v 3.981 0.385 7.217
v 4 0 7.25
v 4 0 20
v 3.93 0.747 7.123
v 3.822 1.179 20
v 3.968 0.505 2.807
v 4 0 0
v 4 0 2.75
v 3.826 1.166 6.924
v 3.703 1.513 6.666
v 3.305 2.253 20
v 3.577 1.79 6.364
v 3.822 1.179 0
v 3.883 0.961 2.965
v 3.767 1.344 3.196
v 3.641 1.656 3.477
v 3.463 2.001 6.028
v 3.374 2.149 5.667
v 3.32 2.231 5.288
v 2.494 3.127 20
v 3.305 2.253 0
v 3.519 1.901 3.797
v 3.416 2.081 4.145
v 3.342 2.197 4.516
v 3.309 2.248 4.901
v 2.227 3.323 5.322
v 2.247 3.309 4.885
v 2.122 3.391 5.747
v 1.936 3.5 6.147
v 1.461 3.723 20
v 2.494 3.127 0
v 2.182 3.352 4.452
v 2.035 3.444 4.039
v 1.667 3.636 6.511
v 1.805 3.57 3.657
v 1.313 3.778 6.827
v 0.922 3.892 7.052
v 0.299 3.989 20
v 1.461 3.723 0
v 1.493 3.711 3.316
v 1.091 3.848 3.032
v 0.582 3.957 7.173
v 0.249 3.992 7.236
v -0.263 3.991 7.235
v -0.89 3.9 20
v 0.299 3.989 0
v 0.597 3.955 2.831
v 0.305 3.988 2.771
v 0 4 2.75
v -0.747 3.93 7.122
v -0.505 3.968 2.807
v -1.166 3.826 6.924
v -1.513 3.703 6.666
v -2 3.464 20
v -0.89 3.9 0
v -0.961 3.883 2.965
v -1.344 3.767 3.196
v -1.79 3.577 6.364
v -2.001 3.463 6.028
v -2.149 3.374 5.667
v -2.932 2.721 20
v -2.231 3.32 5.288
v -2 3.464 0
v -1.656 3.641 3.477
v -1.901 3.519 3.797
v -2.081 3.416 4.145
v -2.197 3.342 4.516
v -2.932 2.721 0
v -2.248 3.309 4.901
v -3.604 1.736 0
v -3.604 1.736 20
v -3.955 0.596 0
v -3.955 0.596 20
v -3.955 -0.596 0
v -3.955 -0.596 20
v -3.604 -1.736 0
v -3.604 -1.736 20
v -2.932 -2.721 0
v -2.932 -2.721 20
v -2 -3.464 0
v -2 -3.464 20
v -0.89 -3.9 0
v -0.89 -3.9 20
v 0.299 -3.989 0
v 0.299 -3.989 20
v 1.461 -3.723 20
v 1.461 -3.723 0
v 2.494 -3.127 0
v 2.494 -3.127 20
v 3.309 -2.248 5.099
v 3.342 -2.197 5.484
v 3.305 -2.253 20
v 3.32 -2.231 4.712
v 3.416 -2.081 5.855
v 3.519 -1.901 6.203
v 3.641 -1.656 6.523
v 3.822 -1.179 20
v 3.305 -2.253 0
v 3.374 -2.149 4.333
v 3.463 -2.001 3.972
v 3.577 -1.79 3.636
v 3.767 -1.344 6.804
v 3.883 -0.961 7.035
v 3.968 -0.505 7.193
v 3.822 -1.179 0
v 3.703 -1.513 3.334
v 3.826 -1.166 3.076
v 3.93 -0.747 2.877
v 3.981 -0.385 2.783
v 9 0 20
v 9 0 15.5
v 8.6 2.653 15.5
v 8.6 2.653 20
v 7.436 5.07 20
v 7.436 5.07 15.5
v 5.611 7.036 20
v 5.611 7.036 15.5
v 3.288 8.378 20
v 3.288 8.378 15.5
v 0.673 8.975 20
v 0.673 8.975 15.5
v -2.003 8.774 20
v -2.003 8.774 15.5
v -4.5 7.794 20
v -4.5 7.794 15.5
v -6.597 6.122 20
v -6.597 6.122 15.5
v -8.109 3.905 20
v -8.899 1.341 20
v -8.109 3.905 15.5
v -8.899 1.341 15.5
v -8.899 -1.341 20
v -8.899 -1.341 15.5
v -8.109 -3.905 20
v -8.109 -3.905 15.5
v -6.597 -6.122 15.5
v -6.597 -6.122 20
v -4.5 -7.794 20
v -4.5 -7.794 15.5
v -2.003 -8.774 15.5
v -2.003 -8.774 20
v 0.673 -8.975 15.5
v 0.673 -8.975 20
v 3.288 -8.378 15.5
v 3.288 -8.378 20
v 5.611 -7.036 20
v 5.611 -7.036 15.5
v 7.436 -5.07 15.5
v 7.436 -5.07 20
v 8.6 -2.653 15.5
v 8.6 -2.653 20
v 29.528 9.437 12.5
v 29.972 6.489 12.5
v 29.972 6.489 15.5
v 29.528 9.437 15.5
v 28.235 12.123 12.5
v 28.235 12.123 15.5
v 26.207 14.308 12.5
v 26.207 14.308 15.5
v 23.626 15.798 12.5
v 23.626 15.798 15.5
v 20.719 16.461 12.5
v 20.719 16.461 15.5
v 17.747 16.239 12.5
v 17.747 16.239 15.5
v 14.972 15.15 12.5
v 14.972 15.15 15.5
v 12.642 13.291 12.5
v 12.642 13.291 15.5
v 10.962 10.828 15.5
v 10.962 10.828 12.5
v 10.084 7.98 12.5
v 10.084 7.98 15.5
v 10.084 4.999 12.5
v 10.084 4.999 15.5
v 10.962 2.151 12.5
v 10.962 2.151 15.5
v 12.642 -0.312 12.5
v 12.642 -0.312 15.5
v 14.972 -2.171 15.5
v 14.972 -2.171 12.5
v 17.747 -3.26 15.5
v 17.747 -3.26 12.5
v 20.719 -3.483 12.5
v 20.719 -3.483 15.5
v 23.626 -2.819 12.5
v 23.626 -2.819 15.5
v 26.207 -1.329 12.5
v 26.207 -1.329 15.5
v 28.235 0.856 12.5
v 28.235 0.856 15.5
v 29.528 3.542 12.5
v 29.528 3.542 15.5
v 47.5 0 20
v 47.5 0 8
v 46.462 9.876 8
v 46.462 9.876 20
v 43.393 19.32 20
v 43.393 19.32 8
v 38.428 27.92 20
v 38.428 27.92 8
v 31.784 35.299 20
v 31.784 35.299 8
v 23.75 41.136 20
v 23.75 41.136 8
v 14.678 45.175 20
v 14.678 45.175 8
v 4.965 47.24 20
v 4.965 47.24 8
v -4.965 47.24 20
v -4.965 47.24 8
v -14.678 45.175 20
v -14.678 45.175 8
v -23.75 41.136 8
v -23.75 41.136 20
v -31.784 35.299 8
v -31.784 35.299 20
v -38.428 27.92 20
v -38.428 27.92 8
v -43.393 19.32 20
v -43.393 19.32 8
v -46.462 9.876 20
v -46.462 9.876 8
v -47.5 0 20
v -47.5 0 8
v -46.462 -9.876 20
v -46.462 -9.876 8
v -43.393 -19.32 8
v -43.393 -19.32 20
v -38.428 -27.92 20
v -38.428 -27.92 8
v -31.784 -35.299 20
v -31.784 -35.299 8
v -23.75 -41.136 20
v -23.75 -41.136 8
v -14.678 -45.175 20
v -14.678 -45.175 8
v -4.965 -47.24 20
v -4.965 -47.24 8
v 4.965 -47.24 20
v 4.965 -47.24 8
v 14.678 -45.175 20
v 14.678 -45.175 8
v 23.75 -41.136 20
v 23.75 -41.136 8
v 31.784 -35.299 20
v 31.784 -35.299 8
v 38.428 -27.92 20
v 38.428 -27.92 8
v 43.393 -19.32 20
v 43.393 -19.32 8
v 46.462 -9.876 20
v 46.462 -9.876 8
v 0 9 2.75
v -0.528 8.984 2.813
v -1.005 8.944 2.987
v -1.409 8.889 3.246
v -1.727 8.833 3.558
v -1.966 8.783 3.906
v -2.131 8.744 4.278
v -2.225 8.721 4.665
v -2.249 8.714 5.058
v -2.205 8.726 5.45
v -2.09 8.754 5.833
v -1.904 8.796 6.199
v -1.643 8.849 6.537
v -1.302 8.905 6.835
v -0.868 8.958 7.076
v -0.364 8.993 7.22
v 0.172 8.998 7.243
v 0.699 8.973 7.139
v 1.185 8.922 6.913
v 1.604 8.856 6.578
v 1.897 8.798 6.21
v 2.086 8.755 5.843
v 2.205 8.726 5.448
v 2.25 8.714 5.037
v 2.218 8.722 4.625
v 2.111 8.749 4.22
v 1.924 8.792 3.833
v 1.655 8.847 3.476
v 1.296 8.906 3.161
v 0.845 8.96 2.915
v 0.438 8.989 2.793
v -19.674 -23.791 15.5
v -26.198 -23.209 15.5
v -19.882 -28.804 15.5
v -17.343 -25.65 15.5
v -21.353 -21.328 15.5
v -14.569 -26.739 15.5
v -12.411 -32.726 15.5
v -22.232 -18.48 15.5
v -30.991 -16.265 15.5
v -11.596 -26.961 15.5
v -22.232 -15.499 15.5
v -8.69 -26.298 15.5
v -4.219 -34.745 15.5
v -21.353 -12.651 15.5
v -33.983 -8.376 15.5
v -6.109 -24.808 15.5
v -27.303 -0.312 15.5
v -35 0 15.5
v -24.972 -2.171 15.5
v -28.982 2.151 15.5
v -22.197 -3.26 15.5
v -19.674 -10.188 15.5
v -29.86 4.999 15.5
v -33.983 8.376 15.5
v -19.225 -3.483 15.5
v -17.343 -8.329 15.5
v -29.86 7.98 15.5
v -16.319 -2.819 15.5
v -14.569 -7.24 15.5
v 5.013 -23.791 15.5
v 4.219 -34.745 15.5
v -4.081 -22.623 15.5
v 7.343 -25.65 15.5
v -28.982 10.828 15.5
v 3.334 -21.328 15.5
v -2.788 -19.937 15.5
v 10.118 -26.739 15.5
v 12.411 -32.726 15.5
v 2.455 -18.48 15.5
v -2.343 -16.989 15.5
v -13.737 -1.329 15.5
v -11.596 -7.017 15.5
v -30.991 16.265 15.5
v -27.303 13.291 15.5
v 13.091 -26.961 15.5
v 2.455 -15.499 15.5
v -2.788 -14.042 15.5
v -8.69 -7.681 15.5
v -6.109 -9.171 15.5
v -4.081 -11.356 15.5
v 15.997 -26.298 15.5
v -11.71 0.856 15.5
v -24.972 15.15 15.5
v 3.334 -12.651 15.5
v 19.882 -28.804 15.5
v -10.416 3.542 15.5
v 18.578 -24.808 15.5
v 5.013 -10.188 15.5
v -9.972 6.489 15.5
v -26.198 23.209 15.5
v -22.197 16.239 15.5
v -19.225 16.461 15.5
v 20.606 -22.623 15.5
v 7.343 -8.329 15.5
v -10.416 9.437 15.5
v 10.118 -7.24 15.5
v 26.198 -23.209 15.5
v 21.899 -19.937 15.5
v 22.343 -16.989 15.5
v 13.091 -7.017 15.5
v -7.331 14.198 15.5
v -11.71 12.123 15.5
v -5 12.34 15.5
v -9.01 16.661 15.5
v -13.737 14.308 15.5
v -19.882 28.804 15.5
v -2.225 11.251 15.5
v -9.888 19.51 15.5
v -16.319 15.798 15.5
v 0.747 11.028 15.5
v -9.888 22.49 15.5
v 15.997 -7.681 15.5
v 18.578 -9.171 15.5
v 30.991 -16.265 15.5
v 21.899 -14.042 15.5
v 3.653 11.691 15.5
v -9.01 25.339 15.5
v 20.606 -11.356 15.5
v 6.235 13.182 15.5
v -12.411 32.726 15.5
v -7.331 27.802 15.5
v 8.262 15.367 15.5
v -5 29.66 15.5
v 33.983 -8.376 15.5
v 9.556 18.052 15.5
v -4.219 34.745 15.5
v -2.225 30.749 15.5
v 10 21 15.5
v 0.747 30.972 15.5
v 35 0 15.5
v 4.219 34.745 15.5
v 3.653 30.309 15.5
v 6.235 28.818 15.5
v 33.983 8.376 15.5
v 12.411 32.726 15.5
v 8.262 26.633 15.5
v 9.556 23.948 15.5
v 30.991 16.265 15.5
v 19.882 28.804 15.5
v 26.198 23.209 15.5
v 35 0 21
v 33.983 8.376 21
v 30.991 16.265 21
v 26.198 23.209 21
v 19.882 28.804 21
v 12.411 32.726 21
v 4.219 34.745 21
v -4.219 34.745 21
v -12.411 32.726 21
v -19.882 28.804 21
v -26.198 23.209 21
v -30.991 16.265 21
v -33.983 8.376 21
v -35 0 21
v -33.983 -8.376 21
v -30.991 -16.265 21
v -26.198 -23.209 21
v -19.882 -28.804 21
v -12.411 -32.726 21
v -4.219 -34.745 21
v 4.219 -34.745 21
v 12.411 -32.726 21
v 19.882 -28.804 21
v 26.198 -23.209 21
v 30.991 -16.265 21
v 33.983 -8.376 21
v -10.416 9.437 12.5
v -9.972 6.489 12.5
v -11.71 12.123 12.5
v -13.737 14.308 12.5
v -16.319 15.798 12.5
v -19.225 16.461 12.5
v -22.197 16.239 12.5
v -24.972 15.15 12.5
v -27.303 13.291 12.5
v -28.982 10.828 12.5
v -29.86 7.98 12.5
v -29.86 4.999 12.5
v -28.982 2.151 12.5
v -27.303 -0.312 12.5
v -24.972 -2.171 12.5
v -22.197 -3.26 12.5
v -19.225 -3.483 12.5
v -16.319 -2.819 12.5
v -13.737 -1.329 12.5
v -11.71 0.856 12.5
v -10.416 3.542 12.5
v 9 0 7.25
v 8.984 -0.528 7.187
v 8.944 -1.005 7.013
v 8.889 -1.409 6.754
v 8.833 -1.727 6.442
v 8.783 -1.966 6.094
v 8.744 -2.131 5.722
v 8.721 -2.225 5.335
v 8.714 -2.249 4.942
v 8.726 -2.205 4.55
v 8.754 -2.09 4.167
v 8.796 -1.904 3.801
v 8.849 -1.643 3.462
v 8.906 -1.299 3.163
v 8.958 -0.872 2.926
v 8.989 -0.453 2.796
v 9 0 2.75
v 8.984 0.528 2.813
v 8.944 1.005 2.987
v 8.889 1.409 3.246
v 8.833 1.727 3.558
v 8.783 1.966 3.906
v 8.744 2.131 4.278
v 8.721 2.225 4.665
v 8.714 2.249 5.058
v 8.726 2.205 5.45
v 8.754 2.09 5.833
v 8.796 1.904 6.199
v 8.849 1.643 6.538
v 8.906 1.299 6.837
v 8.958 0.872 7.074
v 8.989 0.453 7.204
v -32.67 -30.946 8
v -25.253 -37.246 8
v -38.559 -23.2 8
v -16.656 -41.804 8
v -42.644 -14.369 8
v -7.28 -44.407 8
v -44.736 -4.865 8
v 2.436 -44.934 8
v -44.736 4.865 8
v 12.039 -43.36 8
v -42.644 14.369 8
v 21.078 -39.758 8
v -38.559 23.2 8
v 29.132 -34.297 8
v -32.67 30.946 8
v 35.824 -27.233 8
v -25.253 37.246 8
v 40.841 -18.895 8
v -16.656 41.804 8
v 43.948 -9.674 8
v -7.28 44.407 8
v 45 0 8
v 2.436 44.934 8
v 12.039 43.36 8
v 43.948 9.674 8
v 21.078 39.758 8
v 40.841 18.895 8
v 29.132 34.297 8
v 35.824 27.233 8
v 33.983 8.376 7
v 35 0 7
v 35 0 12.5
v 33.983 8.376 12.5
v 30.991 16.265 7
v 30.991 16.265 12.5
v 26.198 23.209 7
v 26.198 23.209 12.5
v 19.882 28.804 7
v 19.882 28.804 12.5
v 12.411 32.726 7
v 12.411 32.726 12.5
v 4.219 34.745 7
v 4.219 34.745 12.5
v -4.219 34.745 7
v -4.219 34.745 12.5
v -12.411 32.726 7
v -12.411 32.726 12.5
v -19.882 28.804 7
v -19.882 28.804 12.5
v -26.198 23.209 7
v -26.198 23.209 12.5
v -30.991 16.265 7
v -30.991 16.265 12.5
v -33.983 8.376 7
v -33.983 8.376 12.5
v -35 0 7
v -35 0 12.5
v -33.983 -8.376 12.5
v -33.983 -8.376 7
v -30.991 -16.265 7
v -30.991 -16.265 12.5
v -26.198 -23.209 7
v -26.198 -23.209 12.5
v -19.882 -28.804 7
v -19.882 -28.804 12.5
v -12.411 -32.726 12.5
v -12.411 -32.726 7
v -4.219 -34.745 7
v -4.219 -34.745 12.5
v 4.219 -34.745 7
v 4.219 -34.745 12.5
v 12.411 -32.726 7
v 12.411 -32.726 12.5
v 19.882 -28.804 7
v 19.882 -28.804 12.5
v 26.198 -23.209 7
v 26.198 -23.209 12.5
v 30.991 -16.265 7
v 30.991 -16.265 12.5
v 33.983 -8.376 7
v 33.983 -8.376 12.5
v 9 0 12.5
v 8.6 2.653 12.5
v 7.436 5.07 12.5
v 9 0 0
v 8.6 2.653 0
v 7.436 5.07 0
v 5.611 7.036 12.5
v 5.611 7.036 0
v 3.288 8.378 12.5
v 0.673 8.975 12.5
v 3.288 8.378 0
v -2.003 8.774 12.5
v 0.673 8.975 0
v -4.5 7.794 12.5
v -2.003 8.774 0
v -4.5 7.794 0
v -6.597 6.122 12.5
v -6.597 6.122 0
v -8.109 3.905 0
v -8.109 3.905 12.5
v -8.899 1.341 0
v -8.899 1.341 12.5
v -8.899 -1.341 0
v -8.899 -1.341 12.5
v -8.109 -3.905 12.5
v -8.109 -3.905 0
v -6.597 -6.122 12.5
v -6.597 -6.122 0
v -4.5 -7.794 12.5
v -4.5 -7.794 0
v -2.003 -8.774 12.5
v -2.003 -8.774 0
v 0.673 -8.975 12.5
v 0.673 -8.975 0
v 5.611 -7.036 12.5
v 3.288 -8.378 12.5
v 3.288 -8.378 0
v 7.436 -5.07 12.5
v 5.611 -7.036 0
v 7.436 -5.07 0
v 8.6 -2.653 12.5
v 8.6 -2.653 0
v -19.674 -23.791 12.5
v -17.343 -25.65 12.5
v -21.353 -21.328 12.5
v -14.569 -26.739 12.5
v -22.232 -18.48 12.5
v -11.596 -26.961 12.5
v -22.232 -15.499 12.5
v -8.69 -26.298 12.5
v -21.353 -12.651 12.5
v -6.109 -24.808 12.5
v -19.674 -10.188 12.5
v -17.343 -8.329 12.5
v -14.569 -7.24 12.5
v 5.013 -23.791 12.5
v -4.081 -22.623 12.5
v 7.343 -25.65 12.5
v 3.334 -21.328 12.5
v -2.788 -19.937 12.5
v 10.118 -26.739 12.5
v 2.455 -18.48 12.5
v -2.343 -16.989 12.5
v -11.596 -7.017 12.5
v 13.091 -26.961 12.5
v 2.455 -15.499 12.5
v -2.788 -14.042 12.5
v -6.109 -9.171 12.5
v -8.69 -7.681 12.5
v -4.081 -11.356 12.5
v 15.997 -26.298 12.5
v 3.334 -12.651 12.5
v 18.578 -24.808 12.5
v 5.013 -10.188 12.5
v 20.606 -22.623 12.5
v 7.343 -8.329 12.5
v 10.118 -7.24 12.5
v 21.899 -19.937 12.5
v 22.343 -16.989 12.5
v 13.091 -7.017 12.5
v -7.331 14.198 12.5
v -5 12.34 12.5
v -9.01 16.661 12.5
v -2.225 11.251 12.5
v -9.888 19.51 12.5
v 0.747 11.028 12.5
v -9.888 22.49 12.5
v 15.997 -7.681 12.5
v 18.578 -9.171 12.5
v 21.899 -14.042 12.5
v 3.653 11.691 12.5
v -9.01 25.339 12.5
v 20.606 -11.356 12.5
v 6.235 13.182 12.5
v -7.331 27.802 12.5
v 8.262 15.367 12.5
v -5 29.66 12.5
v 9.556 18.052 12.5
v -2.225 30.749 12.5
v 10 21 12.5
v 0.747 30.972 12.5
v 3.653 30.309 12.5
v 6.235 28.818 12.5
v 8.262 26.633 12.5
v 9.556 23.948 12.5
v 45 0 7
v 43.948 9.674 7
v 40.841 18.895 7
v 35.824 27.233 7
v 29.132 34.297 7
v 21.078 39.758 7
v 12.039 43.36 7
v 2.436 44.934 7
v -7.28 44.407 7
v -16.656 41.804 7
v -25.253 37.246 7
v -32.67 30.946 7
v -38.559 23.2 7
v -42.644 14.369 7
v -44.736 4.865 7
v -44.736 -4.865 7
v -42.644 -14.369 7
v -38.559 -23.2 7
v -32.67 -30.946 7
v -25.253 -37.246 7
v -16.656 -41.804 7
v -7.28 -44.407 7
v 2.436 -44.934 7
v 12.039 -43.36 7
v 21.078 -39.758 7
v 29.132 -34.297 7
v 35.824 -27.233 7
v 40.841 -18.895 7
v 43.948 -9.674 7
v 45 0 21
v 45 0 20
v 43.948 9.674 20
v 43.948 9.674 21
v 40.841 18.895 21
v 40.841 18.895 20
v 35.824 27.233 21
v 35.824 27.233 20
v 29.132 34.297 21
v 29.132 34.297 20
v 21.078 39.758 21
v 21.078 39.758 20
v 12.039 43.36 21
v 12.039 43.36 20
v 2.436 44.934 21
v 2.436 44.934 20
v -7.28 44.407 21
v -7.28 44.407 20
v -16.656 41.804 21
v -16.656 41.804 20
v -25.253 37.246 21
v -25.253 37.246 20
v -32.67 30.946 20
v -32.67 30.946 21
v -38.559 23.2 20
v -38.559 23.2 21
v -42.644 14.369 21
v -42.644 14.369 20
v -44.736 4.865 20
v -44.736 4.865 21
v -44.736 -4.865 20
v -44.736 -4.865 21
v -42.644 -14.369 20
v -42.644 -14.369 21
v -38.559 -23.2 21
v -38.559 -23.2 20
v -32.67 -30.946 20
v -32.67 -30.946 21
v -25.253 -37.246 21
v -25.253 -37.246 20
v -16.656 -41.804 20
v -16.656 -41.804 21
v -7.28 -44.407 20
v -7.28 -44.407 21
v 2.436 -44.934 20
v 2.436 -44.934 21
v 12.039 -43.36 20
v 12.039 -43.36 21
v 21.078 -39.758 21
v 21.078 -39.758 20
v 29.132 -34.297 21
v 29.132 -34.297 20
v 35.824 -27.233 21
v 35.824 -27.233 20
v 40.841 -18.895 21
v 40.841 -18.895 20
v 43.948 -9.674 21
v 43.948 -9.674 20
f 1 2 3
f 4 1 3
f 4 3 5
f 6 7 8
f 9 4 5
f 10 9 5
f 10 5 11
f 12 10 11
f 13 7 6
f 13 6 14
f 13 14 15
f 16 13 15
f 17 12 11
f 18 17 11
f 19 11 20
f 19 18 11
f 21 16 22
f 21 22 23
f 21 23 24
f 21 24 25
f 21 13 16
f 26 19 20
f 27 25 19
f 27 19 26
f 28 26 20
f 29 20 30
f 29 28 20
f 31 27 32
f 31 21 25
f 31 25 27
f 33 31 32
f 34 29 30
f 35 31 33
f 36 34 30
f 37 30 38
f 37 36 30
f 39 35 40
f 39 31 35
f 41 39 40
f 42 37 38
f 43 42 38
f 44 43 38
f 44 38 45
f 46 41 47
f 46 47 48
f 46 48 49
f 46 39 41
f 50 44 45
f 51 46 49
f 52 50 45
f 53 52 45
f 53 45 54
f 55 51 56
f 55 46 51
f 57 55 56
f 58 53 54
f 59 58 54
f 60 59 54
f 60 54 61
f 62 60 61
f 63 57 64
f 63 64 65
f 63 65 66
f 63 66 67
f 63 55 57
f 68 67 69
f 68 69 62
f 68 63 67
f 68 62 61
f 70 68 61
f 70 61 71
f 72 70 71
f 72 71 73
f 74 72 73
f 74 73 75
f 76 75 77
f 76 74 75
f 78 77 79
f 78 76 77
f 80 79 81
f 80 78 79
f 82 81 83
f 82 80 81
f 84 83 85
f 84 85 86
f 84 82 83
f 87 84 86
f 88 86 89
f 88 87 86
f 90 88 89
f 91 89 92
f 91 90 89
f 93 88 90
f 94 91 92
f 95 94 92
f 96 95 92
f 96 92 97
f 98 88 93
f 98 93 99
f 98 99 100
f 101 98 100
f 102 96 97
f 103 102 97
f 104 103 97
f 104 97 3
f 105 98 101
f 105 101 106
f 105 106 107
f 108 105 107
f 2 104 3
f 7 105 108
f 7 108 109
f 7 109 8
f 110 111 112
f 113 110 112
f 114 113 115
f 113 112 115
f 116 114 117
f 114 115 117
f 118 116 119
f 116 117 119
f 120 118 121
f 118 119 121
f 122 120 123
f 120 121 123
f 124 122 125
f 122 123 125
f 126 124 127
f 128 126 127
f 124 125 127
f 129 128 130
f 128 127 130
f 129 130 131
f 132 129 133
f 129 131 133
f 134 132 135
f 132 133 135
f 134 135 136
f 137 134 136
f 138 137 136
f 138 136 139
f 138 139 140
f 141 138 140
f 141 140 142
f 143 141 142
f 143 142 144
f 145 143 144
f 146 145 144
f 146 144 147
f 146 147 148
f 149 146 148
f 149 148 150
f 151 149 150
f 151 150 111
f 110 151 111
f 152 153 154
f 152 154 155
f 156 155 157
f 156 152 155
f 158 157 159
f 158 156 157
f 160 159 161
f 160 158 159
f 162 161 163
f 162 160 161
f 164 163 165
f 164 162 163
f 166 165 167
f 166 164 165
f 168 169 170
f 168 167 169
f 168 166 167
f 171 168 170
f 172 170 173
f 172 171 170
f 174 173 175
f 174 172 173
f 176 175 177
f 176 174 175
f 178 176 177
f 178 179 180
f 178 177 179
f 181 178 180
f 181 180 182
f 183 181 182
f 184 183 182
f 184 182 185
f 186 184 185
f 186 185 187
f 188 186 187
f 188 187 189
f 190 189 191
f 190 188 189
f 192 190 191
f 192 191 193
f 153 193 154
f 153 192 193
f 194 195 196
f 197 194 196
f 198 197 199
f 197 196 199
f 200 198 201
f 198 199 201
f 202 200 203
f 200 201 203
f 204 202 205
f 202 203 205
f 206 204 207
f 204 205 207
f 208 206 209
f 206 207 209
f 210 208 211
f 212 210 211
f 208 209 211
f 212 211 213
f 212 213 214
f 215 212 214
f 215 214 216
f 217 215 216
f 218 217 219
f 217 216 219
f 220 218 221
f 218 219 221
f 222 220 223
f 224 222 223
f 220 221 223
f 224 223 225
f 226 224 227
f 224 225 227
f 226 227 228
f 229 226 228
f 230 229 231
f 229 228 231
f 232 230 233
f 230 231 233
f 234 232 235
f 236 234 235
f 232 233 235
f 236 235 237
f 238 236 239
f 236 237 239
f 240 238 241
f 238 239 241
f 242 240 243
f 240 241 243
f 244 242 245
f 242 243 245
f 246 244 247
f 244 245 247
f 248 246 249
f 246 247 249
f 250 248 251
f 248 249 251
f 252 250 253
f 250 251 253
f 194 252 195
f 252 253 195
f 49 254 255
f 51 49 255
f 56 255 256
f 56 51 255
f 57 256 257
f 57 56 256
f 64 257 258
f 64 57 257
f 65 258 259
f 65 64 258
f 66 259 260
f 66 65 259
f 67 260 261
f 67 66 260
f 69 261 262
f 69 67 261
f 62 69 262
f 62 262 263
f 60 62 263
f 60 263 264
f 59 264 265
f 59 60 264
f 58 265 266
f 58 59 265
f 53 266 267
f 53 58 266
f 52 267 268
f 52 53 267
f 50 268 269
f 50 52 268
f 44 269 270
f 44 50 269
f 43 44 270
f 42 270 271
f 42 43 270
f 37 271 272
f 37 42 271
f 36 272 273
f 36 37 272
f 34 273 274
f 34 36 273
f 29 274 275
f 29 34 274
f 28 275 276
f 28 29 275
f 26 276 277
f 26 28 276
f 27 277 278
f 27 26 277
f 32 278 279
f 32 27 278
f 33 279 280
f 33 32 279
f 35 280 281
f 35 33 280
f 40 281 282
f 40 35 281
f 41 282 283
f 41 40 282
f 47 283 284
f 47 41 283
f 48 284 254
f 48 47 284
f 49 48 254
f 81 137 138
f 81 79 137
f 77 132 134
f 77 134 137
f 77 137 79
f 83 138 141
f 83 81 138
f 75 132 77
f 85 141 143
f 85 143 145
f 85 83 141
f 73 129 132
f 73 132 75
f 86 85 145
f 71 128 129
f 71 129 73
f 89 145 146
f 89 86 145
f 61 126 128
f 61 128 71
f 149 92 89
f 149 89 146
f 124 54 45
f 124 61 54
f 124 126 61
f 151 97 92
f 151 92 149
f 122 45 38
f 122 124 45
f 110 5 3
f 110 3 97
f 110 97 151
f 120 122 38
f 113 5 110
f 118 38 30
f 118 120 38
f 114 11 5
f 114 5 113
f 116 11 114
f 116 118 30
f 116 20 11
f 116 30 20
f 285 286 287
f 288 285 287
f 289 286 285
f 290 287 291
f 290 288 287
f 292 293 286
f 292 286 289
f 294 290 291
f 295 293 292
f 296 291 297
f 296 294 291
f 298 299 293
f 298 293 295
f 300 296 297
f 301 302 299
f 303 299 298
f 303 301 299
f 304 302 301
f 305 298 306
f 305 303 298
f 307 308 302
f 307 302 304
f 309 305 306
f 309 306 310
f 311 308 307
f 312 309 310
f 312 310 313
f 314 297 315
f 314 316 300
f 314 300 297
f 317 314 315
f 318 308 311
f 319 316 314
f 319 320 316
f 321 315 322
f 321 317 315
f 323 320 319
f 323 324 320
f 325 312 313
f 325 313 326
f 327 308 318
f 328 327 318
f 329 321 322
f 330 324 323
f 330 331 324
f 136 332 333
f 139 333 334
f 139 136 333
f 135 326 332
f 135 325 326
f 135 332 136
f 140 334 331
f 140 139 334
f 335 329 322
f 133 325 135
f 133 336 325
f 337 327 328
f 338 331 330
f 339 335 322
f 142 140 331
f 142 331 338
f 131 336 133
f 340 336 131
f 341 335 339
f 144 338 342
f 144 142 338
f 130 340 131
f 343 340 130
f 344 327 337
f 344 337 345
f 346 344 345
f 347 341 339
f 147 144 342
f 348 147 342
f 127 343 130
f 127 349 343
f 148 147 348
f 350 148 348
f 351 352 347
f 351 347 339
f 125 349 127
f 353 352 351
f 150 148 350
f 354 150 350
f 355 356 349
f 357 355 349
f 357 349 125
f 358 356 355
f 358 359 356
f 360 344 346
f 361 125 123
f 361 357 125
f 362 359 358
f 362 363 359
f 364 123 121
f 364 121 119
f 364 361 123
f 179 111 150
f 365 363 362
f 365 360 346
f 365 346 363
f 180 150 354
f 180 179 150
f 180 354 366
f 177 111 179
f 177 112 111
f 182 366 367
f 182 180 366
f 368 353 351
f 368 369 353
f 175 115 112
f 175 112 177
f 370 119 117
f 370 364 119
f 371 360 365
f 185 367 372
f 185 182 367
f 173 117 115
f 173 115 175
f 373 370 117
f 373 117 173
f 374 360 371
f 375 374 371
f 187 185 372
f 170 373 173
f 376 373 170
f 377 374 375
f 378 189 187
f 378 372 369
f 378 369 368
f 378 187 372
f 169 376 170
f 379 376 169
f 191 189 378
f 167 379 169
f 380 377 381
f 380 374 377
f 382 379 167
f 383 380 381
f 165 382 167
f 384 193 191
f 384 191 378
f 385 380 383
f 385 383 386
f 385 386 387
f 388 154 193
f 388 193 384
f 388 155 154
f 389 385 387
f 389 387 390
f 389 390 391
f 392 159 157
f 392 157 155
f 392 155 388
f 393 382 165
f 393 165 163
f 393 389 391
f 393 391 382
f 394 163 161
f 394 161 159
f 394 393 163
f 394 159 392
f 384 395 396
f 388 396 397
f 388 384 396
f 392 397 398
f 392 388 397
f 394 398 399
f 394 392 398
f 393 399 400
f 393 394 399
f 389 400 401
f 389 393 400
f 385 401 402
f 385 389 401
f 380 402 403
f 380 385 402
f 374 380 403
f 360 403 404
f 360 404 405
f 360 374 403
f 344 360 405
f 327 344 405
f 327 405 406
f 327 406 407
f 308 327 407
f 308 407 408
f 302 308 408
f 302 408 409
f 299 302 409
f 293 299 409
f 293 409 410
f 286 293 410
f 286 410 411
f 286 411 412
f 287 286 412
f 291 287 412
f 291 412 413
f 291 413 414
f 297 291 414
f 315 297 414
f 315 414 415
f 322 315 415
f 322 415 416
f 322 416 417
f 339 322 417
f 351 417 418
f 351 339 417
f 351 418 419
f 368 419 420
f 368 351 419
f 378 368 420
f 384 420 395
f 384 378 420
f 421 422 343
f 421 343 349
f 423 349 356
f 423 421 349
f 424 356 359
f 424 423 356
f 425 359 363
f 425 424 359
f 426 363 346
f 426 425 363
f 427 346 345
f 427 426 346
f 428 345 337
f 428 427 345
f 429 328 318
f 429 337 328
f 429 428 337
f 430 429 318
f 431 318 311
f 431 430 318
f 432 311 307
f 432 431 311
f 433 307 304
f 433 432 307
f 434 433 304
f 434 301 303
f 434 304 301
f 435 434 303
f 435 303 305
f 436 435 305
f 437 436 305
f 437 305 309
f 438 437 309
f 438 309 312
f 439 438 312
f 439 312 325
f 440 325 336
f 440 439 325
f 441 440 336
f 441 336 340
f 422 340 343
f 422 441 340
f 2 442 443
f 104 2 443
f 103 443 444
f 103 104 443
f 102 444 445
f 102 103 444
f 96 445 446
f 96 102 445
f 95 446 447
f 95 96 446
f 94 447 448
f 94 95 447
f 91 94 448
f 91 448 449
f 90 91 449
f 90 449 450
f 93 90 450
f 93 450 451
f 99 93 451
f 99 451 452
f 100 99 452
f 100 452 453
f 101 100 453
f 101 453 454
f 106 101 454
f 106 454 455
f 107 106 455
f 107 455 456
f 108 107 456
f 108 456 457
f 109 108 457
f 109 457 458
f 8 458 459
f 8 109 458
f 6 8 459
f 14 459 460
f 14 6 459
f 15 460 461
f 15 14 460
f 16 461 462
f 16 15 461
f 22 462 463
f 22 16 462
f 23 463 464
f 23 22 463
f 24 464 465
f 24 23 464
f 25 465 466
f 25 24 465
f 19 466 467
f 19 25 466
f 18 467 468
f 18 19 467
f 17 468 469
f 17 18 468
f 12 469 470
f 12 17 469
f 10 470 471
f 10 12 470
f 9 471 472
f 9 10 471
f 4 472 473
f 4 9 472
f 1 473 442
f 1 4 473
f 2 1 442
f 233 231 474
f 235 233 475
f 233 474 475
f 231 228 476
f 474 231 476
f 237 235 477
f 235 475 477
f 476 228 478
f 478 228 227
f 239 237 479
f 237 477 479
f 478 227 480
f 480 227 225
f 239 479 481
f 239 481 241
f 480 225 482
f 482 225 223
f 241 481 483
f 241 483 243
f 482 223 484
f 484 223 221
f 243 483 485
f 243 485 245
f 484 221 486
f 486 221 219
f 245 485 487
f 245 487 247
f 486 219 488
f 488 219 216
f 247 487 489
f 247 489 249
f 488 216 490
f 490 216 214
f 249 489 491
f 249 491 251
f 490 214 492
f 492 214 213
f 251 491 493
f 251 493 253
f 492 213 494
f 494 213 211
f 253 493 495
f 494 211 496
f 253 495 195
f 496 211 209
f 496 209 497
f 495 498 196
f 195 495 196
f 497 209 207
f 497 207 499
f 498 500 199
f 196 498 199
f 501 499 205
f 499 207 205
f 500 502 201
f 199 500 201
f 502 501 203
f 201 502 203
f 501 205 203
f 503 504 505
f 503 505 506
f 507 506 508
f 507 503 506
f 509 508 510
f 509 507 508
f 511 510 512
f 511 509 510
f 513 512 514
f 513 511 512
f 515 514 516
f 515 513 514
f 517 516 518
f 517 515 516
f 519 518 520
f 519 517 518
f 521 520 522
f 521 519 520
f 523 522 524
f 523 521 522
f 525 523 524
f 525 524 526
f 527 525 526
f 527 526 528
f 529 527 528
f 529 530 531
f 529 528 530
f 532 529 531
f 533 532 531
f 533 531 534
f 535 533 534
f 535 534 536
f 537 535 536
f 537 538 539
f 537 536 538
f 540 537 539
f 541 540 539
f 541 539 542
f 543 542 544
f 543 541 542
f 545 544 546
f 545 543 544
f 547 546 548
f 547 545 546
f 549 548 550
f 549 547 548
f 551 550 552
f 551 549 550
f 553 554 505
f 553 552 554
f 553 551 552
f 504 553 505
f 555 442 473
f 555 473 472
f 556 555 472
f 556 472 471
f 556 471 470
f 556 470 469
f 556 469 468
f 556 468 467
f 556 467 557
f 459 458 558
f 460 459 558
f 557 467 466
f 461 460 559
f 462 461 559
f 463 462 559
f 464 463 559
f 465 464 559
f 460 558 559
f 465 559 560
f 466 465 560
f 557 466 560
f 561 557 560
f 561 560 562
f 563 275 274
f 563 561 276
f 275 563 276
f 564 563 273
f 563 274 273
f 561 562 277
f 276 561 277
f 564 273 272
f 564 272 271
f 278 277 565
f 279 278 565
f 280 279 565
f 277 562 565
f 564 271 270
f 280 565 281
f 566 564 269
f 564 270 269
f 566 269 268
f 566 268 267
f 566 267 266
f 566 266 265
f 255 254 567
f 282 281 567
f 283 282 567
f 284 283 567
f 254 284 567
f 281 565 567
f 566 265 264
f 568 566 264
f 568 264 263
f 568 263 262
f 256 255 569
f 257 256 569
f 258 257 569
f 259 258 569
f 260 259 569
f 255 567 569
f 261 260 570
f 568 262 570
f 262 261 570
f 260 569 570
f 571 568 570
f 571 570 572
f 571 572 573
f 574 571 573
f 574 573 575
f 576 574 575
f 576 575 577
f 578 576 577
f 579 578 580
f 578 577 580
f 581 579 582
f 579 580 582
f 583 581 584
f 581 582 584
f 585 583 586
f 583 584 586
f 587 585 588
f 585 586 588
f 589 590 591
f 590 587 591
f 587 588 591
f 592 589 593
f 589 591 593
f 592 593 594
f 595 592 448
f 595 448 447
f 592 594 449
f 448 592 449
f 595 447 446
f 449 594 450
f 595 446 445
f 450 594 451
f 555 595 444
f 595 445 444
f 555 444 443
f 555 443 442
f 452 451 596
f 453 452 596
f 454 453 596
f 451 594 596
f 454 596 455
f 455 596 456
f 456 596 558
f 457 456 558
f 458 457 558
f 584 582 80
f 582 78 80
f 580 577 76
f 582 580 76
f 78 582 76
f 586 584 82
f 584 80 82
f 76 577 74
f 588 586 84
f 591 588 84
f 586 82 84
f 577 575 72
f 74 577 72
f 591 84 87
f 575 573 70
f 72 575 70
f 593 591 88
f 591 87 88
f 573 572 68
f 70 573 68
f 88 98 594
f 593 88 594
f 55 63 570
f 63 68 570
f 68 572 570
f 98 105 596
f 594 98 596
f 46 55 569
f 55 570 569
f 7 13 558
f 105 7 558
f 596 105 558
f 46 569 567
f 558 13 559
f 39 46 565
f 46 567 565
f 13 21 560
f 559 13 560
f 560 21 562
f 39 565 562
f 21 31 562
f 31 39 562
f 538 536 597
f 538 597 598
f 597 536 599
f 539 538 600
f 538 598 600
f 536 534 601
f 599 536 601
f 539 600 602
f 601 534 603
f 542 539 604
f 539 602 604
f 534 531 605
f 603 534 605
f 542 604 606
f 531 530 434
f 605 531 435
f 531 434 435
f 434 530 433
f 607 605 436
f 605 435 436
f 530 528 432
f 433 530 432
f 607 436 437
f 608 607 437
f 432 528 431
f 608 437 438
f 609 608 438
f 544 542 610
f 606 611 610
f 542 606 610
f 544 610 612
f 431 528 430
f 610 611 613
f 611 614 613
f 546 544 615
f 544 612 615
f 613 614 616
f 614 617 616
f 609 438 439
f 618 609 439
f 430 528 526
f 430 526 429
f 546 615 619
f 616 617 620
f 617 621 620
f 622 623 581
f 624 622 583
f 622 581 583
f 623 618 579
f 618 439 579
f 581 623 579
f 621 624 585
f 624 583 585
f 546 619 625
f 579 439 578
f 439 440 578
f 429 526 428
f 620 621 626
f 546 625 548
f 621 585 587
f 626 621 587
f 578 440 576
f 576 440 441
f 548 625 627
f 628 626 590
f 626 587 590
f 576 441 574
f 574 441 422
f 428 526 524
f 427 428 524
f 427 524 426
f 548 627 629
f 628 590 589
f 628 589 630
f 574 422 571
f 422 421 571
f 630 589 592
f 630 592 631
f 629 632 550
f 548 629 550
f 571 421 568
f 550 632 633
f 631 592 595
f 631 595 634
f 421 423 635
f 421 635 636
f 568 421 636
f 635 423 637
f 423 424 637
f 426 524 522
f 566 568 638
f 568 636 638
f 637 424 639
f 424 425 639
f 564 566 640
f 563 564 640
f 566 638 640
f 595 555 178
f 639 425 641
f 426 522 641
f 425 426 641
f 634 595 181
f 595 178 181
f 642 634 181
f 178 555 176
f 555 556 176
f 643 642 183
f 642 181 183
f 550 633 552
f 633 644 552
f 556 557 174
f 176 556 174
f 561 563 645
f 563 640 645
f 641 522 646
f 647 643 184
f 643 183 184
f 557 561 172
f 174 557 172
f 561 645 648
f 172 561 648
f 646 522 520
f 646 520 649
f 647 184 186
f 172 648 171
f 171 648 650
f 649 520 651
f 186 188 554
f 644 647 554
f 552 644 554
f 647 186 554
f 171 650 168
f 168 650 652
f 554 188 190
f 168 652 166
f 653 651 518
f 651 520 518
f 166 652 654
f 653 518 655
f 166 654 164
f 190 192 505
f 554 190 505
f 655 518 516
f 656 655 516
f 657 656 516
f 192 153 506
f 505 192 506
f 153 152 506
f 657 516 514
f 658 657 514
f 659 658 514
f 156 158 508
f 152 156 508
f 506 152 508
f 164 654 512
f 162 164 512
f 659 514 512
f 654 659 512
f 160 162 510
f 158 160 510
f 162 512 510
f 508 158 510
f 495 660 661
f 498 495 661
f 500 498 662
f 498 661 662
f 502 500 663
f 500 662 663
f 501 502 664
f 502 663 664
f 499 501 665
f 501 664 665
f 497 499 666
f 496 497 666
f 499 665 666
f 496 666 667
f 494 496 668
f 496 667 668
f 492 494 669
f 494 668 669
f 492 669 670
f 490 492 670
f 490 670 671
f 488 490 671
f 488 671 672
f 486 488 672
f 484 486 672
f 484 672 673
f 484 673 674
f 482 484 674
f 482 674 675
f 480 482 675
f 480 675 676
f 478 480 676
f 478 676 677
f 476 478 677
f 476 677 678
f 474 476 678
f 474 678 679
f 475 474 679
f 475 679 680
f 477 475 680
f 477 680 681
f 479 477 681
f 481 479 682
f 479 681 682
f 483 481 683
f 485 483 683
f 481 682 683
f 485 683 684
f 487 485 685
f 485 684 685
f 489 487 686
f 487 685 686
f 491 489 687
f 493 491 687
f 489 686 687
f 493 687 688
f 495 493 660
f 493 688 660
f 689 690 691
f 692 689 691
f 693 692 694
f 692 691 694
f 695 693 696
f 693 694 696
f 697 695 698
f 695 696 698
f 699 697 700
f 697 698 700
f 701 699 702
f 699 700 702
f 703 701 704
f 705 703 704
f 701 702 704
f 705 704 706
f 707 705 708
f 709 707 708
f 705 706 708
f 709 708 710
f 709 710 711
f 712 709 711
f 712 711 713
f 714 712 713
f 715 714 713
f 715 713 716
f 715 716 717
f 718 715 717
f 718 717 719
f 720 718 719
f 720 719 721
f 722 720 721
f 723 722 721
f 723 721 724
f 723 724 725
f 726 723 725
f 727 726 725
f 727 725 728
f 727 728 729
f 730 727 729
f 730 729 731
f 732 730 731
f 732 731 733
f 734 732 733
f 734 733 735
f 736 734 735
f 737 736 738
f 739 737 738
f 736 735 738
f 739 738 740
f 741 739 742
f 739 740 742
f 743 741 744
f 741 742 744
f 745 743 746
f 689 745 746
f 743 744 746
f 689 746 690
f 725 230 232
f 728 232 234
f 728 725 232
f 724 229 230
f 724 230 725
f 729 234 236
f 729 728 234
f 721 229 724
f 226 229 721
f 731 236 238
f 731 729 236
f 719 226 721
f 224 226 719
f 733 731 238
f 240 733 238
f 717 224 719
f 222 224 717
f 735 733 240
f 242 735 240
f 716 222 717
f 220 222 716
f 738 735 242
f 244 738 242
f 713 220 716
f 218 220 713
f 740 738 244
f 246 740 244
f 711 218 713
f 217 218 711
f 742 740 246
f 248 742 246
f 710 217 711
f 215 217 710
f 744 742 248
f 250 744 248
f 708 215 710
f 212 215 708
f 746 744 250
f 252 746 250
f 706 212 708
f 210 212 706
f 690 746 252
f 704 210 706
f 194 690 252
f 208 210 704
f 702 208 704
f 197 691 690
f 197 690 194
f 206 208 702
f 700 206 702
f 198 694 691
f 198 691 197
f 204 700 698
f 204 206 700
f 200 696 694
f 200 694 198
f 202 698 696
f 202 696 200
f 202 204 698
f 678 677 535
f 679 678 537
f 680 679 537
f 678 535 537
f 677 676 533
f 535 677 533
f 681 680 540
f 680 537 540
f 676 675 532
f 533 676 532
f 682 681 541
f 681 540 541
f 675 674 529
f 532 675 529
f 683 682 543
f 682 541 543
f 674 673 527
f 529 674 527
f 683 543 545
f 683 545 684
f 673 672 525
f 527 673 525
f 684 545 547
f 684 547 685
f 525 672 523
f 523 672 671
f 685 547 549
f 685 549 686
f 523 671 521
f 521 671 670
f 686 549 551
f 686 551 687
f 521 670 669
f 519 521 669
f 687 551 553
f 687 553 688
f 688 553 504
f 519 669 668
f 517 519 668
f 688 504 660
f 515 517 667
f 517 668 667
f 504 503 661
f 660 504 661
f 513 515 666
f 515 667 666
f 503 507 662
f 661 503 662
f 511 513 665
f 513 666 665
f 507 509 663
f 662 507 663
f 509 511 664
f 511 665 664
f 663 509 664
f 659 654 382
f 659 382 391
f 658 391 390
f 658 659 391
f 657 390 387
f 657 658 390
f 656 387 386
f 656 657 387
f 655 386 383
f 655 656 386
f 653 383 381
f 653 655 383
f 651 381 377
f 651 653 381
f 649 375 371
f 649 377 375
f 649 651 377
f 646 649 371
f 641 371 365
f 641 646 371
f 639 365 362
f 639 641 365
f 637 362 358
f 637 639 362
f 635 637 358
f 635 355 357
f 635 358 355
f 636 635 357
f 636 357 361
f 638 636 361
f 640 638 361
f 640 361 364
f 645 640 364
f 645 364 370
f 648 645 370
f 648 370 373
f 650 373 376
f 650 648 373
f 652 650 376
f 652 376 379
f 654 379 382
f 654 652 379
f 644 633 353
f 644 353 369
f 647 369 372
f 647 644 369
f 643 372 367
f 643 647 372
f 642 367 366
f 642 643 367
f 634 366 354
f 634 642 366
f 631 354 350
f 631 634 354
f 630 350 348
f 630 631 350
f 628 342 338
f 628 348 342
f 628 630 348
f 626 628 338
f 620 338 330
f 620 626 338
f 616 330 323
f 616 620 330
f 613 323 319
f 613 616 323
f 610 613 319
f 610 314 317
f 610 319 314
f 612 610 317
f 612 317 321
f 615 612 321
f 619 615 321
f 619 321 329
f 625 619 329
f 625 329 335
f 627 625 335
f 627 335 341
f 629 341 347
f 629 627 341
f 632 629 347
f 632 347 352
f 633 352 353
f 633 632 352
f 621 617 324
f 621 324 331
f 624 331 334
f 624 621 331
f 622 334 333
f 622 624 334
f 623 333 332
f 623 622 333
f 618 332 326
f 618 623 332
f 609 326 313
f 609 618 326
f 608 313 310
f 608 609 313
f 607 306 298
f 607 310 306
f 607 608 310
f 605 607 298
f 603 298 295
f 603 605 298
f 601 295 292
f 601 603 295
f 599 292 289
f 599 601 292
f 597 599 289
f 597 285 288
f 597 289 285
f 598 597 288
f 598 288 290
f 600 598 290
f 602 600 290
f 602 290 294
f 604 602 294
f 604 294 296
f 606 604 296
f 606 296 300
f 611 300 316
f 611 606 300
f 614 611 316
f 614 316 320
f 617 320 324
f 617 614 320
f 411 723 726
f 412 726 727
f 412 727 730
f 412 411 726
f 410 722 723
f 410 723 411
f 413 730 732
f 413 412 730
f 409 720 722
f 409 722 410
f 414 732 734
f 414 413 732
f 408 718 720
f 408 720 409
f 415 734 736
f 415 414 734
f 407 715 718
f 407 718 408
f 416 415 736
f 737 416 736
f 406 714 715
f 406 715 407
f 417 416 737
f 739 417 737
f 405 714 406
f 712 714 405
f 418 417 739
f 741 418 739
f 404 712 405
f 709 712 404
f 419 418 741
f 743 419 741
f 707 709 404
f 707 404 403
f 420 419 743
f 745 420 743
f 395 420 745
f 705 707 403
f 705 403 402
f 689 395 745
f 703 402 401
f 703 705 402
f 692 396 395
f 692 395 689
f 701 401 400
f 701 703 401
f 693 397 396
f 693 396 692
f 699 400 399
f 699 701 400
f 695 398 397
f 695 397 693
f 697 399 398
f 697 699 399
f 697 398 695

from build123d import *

# Parameters (mm, degrees)
SKETCH_1_R               = 9
SKETCH_1_R_2             = 4
EXTRUDE_1_DEPTH          = 20
EXTRUDE_2_DEPTH          = 1.5
EXTRUDE_2_DEPTH_BACK     = 1.5
SKETCH_2_R               = 45
CUT_EXTRUDE_2_DEPTH      = 67.708320321
CUT_EXTRUDE_2_DEPTH_BACK = 67.708320321
SKETCH_1_2_R             = 4
CUT_EXTRUDE_3_DEPTH      = 66.5
CUT_EXTRUDE_3_DEPTH_BACK = 66.5
SKETCH_3_R               = 10
EXTRUDE_3_DEPTH          = 7
EXTRUDE_3_DEPTH_BACK     = 7
SKETCH_5_R               = 45
SKETCH_5_R_2             = 35
EXTRUDE_4_DEPTH          = 6
EXTRUDE_4_DEPTH_BACK     = 6
SKETCH_6_R               = 47.5
SKETCH_6_R_2             = 45


with BuildPart() as part:
    # 스케치1 → 보스-돌출1 (new body)
    with BuildSketch(Plane.XY):
        Circle(SKETCH_1_R)
        Circle(SKETCH_1_R_2, mode=Mode.SUBTRACT)
    extrude(amount=EXTRUDE_1_DEPTH)

    # 스케치2 → 보스-돌출2 (add, two sides: drawn at the far end of the back side and taken through both)
    with BuildSketch(Plane.XY.offset(14).offset(-EXTRUDE_2_DEPTH_BACK)):
        Circle(SKETCH_2_R)
    extrude(amount=EXTRUDE_2_DEPTH + EXTRUDE_2_DEPTH_BACK)

    # 스케치1<2> → 컷-돌출2 (cut, two sides: drawn at the far end of the back side and taken through both)
    with BuildSketch(Plane.XY.offset(-CUT_EXTRUDE_2_DEPTH_BACK)):
        Circle(SKETCH_1_2_R)
    extrude(amount=CUT_EXTRUDE_2_DEPTH + CUT_EXTRUDE_2_DEPTH_BACK, mode=Mode.SUBTRACT)

    # 스케치3 → 컷-돌출3 (cut, two sides: drawn at the far end of the back side and taken through both)
    with BuildSketch(Plane.XY.offset(15.5).offset(-CUT_EXTRUDE_3_DEPTH_BACK)):
        with Locations((0, 21)):
            Circle(SKETCH_3_R)
        with Locations((19.972186842, 6.489356882)):
            Circle(SKETCH_3_R)
        with Locations((12.343490298, -16.989356882)):
            Circle(SKETCH_3_R)
        with Locations((-12.343490298, -16.989356882)):
            Circle(SKETCH_3_R)
        with Locations((-19.972186842, 6.489356882)):
            Circle(SKETCH_3_R)
    extrude(amount=CUT_EXTRUDE_3_DEPTH + CUT_EXTRUDE_3_DEPTH_BACK, mode=Mode.SUBTRACT)

    # 스케치5 → 보스-돌출3 (add, two sides: drawn at the far end of the back side and taken through both)
    with BuildSketch(Plane.XY.offset(14).offset(-EXTRUDE_3_DEPTH_BACK)):
        Circle(SKETCH_5_R)
        Circle(SKETCH_5_R_2, mode=Mode.SUBTRACT)
    extrude(amount=EXTRUDE_3_DEPTH + EXTRUDE_3_DEPTH_BACK)

    # 스케치6 → 보스-돌출4 (add, two sides: drawn at the far end of the back side and taken through both)
    with BuildSketch(Plane.XY.offset(14).offset(-EXTRUDE_4_DEPTH_BACK)):
        Circle(SKETCH_6_R)
        Circle(SKETCH_6_R_2, mode=Mode.SUBTRACT)
    extrude(amount=EXTRUDE_4_DEPTH + EXTRUDE_4_DEPTH_BACK)

    # 스케치9 → M4 여유 구멍1 (revolve, cut)
    with BuildSketch(Plane(origin=(0, 0, 5), x_dir=(0, 0, -1), z_dir=(1, 0, 0))):
        Polygon((0, 0), (0, 31.351936393), (2.25, 30), (2.25, 0), align=None)
    revolve(axis=Axis((0, -6.35, 5), (0, 1, 0)), mode=Mode.SUBTRACT)

    # 스케치12 → M4 여유 구멍2 (revolve, cut)
    with BuildSketch(Plane(origin=(0, 0, 5), x_dir=(0, 0, 1), z_dir=(0, 1, 0))):
        Polygon((0, 0), (0, 31.351936393), (2.25, 30), (2.25, 0), align=None)
    revolve(axis=Axis((-6.35, 0, 5), (1, 0, 0)), mode=Mode.SUBTRACT)


solid = part.part
